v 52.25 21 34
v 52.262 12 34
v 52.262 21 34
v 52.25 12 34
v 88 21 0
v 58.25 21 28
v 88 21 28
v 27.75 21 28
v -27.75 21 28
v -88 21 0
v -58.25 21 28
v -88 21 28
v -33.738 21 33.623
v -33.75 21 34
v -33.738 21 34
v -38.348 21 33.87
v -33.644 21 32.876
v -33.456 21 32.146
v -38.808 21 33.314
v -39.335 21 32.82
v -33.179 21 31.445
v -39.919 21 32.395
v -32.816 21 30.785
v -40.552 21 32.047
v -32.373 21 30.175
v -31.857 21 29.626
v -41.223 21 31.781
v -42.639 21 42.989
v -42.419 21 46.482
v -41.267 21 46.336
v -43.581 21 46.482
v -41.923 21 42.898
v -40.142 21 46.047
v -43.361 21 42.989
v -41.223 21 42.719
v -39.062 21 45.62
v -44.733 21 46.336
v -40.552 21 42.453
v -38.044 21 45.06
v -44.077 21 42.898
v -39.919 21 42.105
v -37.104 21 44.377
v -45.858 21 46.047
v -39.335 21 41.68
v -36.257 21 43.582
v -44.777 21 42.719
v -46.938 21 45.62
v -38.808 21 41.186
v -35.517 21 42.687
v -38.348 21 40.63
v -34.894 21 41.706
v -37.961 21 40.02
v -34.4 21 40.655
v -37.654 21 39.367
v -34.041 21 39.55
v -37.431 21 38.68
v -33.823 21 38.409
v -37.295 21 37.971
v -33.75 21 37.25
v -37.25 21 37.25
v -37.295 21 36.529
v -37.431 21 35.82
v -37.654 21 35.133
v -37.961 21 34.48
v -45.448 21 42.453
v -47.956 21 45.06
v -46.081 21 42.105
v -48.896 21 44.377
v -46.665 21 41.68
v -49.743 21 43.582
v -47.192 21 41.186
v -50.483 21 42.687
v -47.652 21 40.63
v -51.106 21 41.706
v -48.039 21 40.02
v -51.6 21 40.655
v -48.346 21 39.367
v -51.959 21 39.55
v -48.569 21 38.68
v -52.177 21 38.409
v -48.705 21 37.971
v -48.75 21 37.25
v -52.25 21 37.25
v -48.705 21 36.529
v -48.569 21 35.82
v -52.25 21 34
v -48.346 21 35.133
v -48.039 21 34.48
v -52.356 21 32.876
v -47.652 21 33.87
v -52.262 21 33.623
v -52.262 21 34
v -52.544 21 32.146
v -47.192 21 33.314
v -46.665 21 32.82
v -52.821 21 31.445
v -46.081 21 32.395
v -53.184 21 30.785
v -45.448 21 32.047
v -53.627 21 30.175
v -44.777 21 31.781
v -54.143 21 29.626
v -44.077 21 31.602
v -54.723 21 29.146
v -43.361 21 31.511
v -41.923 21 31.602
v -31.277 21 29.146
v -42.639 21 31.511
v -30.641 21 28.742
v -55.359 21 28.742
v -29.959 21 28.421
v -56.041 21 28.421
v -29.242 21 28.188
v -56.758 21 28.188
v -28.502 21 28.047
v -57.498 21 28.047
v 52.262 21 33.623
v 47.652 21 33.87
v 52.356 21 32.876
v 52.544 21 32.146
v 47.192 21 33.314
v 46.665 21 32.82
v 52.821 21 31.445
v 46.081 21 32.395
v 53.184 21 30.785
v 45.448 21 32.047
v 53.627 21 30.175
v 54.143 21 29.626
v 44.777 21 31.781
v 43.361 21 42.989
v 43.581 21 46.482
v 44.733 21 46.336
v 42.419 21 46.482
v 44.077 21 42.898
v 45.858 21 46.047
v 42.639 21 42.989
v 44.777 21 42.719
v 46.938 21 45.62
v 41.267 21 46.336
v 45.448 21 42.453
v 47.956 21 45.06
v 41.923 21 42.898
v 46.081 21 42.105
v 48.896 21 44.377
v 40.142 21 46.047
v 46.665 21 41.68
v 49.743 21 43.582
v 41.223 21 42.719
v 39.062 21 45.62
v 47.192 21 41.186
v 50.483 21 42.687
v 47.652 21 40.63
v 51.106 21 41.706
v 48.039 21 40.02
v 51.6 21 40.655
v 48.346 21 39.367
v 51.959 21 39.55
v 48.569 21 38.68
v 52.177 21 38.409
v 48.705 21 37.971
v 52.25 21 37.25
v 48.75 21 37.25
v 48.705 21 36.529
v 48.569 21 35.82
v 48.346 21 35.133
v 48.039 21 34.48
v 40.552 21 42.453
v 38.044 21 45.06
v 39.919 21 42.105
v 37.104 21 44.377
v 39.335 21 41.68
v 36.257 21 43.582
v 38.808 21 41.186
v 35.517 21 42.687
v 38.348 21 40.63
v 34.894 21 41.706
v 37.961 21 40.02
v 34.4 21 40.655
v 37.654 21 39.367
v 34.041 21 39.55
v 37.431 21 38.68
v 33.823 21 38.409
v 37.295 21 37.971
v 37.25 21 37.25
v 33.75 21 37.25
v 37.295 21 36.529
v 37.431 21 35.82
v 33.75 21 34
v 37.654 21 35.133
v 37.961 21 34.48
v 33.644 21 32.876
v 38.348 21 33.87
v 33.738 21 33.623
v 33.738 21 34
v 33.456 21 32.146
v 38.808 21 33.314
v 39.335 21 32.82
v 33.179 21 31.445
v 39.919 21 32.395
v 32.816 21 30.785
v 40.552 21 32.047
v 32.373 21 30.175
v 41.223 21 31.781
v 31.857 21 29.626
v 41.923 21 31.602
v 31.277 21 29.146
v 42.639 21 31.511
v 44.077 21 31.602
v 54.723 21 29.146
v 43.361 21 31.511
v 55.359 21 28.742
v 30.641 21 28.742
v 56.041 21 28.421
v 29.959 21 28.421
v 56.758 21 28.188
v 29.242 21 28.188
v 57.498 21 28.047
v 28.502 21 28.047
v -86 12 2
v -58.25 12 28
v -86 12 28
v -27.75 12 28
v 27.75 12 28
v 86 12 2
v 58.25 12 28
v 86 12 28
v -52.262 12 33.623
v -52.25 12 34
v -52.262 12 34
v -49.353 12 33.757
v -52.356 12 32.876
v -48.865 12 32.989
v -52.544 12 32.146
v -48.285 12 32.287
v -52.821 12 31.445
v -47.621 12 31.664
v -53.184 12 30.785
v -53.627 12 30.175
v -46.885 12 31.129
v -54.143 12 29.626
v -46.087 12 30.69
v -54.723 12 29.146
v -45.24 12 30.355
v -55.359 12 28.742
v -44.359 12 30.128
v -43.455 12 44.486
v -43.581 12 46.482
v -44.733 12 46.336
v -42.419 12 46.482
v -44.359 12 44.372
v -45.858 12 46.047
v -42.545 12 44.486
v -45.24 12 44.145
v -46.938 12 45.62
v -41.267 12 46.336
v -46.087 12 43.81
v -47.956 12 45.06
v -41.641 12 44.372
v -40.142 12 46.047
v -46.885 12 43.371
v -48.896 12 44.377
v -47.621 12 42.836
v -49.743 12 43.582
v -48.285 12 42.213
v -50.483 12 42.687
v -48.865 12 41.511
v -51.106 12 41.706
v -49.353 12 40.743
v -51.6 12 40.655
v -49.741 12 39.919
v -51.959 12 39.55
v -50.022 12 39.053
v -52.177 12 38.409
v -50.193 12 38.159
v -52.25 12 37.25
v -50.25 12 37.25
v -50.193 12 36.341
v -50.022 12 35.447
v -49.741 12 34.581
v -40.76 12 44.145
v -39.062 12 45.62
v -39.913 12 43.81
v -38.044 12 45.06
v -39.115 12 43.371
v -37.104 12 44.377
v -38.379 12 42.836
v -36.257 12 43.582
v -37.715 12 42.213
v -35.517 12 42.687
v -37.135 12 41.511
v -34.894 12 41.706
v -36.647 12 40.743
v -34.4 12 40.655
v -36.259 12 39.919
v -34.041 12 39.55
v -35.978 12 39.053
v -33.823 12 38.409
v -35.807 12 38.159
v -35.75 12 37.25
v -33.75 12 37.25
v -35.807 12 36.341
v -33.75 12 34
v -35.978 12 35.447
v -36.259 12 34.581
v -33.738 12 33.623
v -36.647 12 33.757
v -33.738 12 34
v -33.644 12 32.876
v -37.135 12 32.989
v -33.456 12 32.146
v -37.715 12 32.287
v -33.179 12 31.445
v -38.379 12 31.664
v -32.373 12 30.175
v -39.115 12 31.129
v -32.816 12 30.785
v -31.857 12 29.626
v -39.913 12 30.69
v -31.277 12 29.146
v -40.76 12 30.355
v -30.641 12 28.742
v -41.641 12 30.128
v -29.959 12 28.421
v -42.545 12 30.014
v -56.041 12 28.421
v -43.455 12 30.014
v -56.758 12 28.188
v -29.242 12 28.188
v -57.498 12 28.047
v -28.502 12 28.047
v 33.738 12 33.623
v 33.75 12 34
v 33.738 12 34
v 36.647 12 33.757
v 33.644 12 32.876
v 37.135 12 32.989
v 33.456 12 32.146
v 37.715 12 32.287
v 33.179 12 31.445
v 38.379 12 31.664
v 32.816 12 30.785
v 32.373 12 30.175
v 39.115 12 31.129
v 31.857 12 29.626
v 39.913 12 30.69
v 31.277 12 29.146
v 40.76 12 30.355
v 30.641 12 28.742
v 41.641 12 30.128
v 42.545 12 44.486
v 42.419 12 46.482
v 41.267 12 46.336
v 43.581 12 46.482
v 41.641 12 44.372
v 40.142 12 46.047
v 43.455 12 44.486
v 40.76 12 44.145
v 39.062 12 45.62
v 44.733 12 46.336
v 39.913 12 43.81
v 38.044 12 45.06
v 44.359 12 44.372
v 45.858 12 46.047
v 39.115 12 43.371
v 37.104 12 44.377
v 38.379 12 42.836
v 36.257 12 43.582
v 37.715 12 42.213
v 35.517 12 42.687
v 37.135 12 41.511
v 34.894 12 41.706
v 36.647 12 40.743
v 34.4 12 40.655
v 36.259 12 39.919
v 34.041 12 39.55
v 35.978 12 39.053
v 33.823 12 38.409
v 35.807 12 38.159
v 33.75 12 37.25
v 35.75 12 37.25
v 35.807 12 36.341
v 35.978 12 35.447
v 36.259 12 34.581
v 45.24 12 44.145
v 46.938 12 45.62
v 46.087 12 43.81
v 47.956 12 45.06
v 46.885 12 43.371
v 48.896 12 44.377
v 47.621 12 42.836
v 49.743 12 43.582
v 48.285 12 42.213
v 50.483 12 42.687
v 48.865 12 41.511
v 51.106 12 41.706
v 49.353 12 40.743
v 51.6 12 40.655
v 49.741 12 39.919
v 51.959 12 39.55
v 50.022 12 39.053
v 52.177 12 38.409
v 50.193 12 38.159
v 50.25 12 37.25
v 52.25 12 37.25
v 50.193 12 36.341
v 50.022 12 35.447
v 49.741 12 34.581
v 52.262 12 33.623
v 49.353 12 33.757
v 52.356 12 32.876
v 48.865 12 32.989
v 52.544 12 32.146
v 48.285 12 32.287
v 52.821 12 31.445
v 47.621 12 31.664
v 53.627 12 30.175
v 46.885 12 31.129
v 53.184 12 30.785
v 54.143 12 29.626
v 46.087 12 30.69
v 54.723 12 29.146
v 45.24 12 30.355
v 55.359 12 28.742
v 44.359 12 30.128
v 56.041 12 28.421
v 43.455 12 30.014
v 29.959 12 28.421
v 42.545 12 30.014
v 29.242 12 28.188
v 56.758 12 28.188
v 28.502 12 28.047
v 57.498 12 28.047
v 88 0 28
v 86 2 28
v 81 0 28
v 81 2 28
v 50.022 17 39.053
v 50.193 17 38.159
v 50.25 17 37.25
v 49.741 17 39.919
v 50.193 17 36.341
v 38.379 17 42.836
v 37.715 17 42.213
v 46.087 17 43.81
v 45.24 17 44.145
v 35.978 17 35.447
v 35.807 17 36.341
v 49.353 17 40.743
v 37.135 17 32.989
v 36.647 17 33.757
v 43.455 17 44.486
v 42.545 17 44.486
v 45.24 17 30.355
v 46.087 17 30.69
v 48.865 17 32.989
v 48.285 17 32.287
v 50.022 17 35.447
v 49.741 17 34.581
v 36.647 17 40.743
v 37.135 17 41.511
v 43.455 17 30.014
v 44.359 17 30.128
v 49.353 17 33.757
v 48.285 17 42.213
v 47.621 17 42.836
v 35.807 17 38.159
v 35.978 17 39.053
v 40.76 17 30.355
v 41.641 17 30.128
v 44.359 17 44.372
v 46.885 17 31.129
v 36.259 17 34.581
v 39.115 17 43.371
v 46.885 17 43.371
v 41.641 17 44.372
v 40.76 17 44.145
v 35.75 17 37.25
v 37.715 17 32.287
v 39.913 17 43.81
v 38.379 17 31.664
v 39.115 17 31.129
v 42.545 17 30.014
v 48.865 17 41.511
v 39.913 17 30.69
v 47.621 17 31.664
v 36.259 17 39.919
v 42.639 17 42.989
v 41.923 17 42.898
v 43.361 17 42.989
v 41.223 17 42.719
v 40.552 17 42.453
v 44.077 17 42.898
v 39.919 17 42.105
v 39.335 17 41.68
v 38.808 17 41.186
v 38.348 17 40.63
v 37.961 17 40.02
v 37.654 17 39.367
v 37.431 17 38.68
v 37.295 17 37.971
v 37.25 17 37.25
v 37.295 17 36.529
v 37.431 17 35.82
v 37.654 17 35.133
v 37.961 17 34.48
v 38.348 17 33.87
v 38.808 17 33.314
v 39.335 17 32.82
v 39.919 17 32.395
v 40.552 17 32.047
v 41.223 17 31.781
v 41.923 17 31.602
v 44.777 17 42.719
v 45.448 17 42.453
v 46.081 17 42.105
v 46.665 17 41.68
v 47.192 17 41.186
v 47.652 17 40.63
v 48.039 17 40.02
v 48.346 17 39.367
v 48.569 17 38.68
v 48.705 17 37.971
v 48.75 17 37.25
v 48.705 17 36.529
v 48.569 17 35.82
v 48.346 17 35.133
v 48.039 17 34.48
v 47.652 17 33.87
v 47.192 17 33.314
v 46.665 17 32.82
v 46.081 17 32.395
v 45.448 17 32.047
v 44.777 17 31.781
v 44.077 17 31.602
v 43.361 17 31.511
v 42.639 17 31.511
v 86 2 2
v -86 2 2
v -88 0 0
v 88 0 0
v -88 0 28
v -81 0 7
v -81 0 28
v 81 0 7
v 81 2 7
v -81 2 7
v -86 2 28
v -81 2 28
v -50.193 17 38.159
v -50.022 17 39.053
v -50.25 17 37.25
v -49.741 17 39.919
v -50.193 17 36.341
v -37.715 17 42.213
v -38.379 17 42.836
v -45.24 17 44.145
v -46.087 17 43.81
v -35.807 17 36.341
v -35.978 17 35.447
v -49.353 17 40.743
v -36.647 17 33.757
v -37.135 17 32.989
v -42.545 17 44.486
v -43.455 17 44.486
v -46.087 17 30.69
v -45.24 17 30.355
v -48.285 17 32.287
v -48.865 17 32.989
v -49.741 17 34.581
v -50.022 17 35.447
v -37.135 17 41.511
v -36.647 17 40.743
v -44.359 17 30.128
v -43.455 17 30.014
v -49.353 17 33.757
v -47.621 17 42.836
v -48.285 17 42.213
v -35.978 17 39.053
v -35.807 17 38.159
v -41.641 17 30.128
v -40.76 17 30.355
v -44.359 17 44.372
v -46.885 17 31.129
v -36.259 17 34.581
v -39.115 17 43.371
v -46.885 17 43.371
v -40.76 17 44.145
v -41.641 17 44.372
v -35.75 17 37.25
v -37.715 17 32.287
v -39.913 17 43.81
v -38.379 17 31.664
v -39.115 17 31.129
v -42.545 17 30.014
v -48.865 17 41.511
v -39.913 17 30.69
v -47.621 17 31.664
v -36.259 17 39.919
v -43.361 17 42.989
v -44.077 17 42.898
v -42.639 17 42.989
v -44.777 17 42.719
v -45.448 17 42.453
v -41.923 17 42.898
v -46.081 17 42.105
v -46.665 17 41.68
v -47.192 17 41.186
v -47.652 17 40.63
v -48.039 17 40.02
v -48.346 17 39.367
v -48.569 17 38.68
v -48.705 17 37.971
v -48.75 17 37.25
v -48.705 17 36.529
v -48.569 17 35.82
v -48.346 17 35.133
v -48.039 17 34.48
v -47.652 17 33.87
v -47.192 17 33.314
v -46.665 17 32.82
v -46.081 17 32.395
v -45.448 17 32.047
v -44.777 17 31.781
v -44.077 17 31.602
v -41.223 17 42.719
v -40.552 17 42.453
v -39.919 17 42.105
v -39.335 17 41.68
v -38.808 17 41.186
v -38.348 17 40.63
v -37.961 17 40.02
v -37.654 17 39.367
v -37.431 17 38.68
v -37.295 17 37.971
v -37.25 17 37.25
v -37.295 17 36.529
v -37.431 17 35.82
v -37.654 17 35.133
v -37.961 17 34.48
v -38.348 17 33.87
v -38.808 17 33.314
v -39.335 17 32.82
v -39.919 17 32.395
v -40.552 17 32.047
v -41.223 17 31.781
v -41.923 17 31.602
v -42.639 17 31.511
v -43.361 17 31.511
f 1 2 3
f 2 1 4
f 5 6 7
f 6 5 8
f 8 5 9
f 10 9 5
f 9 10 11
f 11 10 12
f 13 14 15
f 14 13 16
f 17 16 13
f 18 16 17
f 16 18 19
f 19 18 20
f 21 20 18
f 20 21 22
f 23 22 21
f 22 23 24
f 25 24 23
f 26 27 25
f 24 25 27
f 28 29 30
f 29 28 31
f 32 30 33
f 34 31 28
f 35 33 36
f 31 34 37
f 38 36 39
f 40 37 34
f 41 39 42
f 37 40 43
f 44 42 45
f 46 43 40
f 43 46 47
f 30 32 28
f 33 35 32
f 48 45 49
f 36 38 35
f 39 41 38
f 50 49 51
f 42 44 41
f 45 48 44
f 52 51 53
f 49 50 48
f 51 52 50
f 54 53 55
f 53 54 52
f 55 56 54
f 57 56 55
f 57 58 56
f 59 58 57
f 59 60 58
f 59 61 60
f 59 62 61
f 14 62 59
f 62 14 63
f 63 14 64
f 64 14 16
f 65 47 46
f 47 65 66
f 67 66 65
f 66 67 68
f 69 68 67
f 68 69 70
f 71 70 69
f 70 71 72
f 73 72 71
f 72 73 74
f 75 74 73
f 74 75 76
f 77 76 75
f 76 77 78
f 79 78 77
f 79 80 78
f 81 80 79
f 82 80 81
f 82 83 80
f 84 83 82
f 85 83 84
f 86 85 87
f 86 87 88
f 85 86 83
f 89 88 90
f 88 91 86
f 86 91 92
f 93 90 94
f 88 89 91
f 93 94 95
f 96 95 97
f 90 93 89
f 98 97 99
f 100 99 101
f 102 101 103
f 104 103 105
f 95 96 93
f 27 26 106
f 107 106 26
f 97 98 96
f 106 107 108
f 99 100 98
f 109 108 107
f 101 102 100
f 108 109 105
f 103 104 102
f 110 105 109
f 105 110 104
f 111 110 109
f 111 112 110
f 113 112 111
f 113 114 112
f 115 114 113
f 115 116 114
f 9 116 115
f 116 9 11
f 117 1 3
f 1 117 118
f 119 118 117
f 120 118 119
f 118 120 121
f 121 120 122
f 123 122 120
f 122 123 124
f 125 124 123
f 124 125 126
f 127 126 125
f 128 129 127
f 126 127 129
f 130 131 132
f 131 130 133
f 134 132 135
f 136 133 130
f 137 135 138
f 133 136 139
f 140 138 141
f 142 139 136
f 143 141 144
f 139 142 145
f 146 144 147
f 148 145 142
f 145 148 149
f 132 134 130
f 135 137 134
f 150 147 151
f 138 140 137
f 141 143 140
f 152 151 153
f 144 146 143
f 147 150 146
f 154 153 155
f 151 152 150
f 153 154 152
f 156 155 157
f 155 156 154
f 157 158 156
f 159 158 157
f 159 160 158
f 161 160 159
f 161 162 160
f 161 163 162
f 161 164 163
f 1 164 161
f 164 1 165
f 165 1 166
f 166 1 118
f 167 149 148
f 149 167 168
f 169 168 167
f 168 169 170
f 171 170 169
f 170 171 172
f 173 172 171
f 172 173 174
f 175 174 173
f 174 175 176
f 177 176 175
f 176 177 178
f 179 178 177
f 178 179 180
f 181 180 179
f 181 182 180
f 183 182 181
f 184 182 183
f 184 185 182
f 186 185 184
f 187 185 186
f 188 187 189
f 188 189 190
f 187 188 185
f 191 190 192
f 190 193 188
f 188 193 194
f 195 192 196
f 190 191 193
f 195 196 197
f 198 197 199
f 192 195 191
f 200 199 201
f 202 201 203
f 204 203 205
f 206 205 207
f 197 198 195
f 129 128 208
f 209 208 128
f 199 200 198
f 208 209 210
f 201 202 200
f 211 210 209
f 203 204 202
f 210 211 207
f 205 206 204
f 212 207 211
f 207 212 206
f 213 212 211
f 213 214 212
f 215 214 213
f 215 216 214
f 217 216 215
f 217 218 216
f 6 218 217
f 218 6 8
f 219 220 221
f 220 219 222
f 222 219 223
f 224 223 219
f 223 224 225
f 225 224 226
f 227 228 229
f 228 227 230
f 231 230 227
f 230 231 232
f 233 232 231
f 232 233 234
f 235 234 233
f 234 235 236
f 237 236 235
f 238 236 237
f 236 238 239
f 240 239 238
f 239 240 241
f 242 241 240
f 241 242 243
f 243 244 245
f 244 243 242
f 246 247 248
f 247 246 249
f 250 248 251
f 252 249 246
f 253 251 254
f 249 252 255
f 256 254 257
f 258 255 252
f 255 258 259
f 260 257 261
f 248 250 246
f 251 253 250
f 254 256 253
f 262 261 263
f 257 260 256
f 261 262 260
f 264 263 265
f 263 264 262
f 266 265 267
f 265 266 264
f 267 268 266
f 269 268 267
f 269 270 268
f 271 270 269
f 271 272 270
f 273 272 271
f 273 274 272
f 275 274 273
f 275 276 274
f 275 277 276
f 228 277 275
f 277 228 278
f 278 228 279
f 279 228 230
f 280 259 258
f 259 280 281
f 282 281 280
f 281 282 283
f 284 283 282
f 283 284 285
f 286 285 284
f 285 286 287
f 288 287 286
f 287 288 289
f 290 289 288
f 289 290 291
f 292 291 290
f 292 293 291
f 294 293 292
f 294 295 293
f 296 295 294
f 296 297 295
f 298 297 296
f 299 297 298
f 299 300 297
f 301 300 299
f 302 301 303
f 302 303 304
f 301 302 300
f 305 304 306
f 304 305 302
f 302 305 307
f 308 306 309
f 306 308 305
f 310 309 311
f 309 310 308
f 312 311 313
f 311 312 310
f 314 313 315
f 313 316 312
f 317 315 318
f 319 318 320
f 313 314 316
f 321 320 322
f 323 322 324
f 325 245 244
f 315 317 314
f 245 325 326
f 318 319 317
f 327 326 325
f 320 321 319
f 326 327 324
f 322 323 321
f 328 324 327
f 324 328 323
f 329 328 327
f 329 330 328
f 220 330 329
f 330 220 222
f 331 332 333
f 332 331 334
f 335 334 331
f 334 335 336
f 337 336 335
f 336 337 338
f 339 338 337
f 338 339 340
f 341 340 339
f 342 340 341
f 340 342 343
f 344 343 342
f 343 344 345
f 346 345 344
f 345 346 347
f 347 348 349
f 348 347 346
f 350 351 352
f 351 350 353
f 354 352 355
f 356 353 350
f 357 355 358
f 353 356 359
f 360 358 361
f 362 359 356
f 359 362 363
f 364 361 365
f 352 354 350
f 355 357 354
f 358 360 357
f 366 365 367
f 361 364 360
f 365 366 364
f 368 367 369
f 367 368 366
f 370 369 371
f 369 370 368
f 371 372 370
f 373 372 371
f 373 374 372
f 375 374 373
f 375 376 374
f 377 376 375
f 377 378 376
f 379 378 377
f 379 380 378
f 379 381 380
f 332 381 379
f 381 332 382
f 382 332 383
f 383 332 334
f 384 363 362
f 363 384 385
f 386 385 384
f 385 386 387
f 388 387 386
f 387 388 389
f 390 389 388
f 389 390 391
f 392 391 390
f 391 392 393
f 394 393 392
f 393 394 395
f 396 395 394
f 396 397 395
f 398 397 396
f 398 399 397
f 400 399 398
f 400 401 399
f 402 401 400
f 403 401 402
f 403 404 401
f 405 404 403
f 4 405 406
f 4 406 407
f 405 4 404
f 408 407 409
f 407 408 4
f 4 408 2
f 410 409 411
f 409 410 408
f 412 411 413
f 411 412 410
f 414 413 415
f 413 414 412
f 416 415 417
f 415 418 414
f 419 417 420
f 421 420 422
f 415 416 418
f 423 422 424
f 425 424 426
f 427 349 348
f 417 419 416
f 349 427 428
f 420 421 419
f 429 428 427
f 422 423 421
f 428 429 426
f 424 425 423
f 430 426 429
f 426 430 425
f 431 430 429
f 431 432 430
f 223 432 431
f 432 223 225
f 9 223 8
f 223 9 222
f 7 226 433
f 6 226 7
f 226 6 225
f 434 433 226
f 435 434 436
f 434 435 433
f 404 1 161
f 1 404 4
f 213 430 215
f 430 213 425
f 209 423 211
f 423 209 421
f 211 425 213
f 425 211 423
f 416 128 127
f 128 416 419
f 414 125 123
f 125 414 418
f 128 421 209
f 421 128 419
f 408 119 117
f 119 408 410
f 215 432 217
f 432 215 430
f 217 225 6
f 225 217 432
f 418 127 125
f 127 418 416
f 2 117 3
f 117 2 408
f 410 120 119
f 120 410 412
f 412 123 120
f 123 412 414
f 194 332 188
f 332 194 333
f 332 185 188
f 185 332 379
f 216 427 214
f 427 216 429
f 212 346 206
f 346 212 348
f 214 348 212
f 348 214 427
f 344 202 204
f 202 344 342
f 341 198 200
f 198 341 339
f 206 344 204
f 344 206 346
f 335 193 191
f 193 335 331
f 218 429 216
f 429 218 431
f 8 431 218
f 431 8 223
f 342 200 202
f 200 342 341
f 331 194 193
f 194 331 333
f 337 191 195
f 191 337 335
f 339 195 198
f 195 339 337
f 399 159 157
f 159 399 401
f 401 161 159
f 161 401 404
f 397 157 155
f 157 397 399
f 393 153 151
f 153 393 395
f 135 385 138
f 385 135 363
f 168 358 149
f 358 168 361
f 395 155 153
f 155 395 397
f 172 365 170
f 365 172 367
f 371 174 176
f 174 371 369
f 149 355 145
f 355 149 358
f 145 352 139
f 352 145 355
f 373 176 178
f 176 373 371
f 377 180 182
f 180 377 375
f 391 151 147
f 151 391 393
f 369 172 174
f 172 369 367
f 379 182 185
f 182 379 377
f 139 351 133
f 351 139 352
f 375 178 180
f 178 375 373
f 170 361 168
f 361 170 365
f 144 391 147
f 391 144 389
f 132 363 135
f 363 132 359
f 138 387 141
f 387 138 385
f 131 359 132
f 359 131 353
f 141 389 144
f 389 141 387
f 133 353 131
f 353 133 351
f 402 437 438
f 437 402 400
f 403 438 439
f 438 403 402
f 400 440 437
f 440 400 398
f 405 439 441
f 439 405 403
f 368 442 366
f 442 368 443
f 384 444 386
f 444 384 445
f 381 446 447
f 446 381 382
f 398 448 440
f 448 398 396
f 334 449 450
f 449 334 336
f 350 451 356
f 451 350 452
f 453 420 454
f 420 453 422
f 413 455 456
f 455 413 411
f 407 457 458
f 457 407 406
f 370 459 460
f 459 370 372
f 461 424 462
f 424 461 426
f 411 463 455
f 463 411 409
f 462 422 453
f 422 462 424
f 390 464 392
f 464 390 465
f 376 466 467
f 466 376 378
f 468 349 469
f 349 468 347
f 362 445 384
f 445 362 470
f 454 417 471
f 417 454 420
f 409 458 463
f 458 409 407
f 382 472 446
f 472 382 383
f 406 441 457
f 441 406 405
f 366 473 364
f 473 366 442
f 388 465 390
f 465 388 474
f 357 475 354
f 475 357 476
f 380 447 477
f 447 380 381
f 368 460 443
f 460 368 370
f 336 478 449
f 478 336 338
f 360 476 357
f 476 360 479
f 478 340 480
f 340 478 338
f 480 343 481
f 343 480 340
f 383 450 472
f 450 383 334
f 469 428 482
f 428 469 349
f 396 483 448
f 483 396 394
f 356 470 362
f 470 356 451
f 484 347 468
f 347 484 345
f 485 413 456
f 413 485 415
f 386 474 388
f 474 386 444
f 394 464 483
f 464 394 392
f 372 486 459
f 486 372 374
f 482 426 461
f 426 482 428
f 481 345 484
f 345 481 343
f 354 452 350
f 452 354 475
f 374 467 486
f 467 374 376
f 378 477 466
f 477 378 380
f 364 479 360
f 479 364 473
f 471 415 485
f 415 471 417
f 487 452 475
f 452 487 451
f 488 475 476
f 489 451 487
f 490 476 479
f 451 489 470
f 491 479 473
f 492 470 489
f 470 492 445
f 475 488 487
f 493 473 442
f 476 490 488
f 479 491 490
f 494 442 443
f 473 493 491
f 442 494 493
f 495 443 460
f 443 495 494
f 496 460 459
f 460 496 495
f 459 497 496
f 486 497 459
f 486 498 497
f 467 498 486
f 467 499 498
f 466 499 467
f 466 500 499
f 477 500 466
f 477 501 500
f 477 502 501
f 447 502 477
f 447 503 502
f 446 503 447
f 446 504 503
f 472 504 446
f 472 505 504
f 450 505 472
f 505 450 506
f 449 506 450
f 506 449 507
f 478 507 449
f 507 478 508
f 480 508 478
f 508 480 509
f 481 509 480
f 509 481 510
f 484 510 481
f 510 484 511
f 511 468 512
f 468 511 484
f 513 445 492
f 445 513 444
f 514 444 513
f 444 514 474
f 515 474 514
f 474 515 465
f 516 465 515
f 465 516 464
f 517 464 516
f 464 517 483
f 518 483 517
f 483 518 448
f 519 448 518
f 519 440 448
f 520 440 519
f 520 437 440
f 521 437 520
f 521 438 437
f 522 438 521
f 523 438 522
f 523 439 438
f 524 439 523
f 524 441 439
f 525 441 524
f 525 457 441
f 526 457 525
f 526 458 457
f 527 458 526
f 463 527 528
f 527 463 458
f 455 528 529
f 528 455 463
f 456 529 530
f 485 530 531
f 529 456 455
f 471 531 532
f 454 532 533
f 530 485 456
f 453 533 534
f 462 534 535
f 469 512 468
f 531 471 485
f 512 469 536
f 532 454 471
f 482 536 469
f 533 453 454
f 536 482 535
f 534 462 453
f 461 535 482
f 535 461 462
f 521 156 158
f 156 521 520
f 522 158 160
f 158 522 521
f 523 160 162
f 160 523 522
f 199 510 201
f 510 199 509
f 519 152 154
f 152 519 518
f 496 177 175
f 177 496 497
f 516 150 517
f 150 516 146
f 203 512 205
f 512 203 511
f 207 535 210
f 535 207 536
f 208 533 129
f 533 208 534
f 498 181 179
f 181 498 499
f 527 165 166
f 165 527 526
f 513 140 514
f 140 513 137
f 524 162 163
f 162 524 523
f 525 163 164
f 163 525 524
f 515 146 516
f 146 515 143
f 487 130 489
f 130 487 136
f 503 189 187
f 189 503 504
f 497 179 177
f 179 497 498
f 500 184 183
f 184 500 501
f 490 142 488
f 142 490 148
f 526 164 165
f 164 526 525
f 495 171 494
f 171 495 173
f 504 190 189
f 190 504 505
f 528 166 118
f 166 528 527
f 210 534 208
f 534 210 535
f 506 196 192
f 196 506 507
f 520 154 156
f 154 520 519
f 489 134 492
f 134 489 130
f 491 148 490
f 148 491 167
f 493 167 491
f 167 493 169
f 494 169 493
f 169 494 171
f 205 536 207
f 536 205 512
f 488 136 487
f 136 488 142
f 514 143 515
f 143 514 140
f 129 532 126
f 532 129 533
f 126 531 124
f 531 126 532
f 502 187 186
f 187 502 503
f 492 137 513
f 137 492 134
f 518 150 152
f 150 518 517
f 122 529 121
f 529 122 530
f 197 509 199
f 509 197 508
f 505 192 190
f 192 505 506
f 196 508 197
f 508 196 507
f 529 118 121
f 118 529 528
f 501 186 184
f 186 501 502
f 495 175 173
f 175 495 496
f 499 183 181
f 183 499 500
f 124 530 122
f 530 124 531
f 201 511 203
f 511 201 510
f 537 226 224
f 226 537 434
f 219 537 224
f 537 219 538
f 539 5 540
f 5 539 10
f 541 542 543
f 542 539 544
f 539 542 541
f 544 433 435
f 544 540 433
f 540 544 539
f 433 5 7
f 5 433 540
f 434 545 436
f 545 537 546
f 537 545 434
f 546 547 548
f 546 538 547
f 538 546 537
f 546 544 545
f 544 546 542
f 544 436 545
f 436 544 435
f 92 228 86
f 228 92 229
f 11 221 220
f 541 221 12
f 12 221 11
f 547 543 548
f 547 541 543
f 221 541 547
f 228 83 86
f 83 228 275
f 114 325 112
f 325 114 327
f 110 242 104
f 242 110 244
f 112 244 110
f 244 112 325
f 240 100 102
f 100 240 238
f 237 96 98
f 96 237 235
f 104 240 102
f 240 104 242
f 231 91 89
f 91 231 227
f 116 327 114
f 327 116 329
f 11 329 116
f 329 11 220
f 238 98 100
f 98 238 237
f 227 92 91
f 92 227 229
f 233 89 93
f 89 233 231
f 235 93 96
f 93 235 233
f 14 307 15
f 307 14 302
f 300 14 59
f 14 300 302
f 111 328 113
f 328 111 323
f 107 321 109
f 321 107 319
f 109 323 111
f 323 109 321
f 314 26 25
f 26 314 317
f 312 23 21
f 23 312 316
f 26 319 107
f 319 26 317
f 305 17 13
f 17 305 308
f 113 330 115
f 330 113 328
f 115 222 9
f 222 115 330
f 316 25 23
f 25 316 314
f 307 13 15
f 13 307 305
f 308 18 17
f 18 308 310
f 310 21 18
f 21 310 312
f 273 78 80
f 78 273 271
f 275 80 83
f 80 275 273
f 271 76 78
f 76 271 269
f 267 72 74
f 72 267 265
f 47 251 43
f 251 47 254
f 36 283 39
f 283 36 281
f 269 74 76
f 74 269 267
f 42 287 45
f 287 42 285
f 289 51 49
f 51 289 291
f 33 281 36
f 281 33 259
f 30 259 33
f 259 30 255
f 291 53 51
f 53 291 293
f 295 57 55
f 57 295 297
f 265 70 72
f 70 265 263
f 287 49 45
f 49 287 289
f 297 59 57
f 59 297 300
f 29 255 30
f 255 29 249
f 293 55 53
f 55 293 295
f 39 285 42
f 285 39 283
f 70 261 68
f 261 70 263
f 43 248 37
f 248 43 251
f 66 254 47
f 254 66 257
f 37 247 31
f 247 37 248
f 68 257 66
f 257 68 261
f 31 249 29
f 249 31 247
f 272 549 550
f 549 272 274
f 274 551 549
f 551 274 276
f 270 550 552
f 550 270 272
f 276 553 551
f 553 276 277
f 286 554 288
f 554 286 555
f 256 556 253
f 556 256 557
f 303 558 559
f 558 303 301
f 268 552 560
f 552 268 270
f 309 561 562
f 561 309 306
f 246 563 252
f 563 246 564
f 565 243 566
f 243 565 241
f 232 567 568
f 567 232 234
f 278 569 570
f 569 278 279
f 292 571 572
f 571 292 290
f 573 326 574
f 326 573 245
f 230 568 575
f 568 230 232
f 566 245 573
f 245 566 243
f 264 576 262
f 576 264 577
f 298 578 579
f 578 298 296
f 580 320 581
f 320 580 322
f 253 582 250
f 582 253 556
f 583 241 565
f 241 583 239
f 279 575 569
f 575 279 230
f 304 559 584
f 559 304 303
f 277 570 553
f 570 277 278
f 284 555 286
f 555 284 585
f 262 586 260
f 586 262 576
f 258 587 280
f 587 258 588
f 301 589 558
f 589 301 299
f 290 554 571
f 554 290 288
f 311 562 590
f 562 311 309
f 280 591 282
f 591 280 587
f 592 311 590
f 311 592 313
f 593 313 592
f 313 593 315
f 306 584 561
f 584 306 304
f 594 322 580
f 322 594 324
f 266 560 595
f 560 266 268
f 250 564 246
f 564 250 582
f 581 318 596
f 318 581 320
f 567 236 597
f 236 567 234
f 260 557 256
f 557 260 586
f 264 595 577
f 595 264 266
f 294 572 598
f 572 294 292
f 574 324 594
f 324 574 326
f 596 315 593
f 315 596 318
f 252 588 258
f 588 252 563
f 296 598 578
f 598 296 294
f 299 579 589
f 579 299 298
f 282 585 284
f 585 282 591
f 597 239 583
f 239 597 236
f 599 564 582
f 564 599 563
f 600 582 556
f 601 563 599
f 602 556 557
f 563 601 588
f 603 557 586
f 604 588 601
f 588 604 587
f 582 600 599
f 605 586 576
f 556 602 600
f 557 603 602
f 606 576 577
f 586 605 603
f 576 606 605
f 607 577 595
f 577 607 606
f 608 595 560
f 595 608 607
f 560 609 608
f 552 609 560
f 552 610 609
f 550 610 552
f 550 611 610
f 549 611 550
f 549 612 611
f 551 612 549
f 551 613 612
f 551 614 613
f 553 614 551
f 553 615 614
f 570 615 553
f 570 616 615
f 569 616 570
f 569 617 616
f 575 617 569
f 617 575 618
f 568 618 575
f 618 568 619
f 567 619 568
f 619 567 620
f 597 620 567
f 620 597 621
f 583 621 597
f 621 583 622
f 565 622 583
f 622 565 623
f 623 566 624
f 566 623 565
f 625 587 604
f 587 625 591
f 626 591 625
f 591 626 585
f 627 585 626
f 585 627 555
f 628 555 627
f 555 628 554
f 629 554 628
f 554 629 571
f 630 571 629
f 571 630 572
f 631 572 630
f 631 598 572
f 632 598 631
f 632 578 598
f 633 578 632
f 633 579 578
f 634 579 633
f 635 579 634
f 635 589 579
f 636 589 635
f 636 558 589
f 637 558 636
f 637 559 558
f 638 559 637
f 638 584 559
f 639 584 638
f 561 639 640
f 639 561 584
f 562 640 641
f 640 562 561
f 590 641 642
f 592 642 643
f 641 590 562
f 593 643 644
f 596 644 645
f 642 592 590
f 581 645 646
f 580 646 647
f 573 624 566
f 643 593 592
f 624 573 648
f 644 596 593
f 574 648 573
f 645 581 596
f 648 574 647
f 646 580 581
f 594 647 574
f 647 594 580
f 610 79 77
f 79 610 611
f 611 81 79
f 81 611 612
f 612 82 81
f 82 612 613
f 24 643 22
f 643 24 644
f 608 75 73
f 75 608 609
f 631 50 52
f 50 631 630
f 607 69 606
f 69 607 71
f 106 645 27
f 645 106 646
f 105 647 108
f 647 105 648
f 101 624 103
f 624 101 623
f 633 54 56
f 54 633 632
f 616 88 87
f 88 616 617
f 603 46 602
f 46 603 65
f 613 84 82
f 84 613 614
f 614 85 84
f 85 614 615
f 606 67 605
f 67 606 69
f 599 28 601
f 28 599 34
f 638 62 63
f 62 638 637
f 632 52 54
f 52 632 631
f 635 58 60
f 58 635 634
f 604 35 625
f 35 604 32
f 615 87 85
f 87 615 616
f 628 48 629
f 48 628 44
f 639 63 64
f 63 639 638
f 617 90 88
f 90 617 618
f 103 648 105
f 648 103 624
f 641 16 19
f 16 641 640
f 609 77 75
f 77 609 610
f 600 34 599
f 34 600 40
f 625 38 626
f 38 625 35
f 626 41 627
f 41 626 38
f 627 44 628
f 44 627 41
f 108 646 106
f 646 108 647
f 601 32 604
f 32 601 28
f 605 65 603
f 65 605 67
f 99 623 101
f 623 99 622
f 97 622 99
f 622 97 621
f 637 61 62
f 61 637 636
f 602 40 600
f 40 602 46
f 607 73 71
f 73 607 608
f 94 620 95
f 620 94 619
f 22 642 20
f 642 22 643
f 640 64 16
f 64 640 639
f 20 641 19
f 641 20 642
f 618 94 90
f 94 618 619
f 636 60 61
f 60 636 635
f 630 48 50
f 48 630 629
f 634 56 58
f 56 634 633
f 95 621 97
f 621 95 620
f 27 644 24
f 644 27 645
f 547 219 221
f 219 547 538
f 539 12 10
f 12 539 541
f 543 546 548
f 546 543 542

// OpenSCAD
// Created by Viet Nguyen 2018
//=============================

//=============================
//Global Constants: 
//  Don't change these. It will break the code.
//=============================


//=============================
//Compiler Options: 
//These will change your viewing options in OpenSCAD
//=============================
$fn = 50;          

//=============================
//Global Print Variables:
//  These will adjust how the part is printed but not affect the overall part shape
//=============================


//=============================
//Global Mechanical Variables: 
//  Change these to adjust physical properties of the part
//=============================
overallThickness = 2;
phoneWidth = 172;
phoneThickness = 12;
suctionNippleDiameter = 14.5;
suctionNippleThickness = 5;
suctionNippleShaftThickness = 4;
holderSideChins = 7;
holderBottomChin = 5;
holderHeight = 28;


//==============================
//Calculated Variables: 
//Do not Change these directly
//==============================
suctionHolesWidth = suctionNippleDiameter+(overallThickness*2);
backThickness = suctionNippleThickness+suctionNippleShaftThickness;
module main()
{
    //add global logic and call part modules here

    mirror([1, 0, 0]) {
      half();
    }
    
    half();
    
}

module half()
{
  // Bottom
  cube([phoneWidth/2,phoneThickness,overallThickness]);
  
  // Back
  translate([0,phoneThickness,0])
  cube([(phoneWidth/2)+overallThickness,backThickness,holderHeight]);

  // Side
  translate([phoneWidth/2,overallThickness,0])
    cube([overallThickness, phoneThickness ,holderHeight]);

  // Bottom Chin
  cube([(phoneWidth/2)+overallThickness, overallThickness, holderBottomChin+overallThickness]);

  // Side Chin
  translate([(phoneWidth/2)-holderSideChins+overallThickness,0,0])
  sideChin();

  // suction holes
  translate([phoneWidth/4,phoneThickness+backThickness,holderHeight+suctionHolesWidth/2])
    rotate([90,0,0])
      suctionHoles();
  
}

module suctionHoles()
{
  
  translate([suctionHolesWidth/2,-suctionHolesWidth/2,0]) rotate([90,0,90]) filet(borderRadius=6, thickness=backThickness);
  translate([-suctionHolesWidth/2,-suctionHolesWidth/2,backThickness]) rotate([270,0,90]) filet(borderRadius=6, thickness=backThickness);
  difference()
  {
    union()
    {
      translate([-suctionHolesWidth/2,-suctionHolesWidth/2,0]) 
        cube([suctionHolesWidth, suctionHolesWidth/2,backThickness]);

      cylinder(d=suctionHolesWidth, h=backThickness, center=false);
    }
    
    // Nipple Part
    union()
    {
      translate([0,0,suctionNippleShaftThickness])
        cylinder(d=suctionNippleDiameter, h=suctionNippleThickness, center=false);
      cylinder(d=(suctionNippleDiameter-3), h=suctionNippleShaftThickness, center=false);
    }
  }
  
 


}

module filet (borderRadius=5, thickness=3, extra=false) {
    borderWidth = borderRadius * 2;
    translate([0,thickness])
        rotate([90,0,0])
            difference()
            {
                cube([borderRadius, borderRadius, thickness]);
                translate([borderRadius, borderRadius, -1]) cylinder(r=borderRadius, h=thickness+2);
            }
    
}

module sideChin ()
{
    cube([holderSideChins,overallThickness, holderHeight]);
}

//execute program and draw the part(s)
main();
